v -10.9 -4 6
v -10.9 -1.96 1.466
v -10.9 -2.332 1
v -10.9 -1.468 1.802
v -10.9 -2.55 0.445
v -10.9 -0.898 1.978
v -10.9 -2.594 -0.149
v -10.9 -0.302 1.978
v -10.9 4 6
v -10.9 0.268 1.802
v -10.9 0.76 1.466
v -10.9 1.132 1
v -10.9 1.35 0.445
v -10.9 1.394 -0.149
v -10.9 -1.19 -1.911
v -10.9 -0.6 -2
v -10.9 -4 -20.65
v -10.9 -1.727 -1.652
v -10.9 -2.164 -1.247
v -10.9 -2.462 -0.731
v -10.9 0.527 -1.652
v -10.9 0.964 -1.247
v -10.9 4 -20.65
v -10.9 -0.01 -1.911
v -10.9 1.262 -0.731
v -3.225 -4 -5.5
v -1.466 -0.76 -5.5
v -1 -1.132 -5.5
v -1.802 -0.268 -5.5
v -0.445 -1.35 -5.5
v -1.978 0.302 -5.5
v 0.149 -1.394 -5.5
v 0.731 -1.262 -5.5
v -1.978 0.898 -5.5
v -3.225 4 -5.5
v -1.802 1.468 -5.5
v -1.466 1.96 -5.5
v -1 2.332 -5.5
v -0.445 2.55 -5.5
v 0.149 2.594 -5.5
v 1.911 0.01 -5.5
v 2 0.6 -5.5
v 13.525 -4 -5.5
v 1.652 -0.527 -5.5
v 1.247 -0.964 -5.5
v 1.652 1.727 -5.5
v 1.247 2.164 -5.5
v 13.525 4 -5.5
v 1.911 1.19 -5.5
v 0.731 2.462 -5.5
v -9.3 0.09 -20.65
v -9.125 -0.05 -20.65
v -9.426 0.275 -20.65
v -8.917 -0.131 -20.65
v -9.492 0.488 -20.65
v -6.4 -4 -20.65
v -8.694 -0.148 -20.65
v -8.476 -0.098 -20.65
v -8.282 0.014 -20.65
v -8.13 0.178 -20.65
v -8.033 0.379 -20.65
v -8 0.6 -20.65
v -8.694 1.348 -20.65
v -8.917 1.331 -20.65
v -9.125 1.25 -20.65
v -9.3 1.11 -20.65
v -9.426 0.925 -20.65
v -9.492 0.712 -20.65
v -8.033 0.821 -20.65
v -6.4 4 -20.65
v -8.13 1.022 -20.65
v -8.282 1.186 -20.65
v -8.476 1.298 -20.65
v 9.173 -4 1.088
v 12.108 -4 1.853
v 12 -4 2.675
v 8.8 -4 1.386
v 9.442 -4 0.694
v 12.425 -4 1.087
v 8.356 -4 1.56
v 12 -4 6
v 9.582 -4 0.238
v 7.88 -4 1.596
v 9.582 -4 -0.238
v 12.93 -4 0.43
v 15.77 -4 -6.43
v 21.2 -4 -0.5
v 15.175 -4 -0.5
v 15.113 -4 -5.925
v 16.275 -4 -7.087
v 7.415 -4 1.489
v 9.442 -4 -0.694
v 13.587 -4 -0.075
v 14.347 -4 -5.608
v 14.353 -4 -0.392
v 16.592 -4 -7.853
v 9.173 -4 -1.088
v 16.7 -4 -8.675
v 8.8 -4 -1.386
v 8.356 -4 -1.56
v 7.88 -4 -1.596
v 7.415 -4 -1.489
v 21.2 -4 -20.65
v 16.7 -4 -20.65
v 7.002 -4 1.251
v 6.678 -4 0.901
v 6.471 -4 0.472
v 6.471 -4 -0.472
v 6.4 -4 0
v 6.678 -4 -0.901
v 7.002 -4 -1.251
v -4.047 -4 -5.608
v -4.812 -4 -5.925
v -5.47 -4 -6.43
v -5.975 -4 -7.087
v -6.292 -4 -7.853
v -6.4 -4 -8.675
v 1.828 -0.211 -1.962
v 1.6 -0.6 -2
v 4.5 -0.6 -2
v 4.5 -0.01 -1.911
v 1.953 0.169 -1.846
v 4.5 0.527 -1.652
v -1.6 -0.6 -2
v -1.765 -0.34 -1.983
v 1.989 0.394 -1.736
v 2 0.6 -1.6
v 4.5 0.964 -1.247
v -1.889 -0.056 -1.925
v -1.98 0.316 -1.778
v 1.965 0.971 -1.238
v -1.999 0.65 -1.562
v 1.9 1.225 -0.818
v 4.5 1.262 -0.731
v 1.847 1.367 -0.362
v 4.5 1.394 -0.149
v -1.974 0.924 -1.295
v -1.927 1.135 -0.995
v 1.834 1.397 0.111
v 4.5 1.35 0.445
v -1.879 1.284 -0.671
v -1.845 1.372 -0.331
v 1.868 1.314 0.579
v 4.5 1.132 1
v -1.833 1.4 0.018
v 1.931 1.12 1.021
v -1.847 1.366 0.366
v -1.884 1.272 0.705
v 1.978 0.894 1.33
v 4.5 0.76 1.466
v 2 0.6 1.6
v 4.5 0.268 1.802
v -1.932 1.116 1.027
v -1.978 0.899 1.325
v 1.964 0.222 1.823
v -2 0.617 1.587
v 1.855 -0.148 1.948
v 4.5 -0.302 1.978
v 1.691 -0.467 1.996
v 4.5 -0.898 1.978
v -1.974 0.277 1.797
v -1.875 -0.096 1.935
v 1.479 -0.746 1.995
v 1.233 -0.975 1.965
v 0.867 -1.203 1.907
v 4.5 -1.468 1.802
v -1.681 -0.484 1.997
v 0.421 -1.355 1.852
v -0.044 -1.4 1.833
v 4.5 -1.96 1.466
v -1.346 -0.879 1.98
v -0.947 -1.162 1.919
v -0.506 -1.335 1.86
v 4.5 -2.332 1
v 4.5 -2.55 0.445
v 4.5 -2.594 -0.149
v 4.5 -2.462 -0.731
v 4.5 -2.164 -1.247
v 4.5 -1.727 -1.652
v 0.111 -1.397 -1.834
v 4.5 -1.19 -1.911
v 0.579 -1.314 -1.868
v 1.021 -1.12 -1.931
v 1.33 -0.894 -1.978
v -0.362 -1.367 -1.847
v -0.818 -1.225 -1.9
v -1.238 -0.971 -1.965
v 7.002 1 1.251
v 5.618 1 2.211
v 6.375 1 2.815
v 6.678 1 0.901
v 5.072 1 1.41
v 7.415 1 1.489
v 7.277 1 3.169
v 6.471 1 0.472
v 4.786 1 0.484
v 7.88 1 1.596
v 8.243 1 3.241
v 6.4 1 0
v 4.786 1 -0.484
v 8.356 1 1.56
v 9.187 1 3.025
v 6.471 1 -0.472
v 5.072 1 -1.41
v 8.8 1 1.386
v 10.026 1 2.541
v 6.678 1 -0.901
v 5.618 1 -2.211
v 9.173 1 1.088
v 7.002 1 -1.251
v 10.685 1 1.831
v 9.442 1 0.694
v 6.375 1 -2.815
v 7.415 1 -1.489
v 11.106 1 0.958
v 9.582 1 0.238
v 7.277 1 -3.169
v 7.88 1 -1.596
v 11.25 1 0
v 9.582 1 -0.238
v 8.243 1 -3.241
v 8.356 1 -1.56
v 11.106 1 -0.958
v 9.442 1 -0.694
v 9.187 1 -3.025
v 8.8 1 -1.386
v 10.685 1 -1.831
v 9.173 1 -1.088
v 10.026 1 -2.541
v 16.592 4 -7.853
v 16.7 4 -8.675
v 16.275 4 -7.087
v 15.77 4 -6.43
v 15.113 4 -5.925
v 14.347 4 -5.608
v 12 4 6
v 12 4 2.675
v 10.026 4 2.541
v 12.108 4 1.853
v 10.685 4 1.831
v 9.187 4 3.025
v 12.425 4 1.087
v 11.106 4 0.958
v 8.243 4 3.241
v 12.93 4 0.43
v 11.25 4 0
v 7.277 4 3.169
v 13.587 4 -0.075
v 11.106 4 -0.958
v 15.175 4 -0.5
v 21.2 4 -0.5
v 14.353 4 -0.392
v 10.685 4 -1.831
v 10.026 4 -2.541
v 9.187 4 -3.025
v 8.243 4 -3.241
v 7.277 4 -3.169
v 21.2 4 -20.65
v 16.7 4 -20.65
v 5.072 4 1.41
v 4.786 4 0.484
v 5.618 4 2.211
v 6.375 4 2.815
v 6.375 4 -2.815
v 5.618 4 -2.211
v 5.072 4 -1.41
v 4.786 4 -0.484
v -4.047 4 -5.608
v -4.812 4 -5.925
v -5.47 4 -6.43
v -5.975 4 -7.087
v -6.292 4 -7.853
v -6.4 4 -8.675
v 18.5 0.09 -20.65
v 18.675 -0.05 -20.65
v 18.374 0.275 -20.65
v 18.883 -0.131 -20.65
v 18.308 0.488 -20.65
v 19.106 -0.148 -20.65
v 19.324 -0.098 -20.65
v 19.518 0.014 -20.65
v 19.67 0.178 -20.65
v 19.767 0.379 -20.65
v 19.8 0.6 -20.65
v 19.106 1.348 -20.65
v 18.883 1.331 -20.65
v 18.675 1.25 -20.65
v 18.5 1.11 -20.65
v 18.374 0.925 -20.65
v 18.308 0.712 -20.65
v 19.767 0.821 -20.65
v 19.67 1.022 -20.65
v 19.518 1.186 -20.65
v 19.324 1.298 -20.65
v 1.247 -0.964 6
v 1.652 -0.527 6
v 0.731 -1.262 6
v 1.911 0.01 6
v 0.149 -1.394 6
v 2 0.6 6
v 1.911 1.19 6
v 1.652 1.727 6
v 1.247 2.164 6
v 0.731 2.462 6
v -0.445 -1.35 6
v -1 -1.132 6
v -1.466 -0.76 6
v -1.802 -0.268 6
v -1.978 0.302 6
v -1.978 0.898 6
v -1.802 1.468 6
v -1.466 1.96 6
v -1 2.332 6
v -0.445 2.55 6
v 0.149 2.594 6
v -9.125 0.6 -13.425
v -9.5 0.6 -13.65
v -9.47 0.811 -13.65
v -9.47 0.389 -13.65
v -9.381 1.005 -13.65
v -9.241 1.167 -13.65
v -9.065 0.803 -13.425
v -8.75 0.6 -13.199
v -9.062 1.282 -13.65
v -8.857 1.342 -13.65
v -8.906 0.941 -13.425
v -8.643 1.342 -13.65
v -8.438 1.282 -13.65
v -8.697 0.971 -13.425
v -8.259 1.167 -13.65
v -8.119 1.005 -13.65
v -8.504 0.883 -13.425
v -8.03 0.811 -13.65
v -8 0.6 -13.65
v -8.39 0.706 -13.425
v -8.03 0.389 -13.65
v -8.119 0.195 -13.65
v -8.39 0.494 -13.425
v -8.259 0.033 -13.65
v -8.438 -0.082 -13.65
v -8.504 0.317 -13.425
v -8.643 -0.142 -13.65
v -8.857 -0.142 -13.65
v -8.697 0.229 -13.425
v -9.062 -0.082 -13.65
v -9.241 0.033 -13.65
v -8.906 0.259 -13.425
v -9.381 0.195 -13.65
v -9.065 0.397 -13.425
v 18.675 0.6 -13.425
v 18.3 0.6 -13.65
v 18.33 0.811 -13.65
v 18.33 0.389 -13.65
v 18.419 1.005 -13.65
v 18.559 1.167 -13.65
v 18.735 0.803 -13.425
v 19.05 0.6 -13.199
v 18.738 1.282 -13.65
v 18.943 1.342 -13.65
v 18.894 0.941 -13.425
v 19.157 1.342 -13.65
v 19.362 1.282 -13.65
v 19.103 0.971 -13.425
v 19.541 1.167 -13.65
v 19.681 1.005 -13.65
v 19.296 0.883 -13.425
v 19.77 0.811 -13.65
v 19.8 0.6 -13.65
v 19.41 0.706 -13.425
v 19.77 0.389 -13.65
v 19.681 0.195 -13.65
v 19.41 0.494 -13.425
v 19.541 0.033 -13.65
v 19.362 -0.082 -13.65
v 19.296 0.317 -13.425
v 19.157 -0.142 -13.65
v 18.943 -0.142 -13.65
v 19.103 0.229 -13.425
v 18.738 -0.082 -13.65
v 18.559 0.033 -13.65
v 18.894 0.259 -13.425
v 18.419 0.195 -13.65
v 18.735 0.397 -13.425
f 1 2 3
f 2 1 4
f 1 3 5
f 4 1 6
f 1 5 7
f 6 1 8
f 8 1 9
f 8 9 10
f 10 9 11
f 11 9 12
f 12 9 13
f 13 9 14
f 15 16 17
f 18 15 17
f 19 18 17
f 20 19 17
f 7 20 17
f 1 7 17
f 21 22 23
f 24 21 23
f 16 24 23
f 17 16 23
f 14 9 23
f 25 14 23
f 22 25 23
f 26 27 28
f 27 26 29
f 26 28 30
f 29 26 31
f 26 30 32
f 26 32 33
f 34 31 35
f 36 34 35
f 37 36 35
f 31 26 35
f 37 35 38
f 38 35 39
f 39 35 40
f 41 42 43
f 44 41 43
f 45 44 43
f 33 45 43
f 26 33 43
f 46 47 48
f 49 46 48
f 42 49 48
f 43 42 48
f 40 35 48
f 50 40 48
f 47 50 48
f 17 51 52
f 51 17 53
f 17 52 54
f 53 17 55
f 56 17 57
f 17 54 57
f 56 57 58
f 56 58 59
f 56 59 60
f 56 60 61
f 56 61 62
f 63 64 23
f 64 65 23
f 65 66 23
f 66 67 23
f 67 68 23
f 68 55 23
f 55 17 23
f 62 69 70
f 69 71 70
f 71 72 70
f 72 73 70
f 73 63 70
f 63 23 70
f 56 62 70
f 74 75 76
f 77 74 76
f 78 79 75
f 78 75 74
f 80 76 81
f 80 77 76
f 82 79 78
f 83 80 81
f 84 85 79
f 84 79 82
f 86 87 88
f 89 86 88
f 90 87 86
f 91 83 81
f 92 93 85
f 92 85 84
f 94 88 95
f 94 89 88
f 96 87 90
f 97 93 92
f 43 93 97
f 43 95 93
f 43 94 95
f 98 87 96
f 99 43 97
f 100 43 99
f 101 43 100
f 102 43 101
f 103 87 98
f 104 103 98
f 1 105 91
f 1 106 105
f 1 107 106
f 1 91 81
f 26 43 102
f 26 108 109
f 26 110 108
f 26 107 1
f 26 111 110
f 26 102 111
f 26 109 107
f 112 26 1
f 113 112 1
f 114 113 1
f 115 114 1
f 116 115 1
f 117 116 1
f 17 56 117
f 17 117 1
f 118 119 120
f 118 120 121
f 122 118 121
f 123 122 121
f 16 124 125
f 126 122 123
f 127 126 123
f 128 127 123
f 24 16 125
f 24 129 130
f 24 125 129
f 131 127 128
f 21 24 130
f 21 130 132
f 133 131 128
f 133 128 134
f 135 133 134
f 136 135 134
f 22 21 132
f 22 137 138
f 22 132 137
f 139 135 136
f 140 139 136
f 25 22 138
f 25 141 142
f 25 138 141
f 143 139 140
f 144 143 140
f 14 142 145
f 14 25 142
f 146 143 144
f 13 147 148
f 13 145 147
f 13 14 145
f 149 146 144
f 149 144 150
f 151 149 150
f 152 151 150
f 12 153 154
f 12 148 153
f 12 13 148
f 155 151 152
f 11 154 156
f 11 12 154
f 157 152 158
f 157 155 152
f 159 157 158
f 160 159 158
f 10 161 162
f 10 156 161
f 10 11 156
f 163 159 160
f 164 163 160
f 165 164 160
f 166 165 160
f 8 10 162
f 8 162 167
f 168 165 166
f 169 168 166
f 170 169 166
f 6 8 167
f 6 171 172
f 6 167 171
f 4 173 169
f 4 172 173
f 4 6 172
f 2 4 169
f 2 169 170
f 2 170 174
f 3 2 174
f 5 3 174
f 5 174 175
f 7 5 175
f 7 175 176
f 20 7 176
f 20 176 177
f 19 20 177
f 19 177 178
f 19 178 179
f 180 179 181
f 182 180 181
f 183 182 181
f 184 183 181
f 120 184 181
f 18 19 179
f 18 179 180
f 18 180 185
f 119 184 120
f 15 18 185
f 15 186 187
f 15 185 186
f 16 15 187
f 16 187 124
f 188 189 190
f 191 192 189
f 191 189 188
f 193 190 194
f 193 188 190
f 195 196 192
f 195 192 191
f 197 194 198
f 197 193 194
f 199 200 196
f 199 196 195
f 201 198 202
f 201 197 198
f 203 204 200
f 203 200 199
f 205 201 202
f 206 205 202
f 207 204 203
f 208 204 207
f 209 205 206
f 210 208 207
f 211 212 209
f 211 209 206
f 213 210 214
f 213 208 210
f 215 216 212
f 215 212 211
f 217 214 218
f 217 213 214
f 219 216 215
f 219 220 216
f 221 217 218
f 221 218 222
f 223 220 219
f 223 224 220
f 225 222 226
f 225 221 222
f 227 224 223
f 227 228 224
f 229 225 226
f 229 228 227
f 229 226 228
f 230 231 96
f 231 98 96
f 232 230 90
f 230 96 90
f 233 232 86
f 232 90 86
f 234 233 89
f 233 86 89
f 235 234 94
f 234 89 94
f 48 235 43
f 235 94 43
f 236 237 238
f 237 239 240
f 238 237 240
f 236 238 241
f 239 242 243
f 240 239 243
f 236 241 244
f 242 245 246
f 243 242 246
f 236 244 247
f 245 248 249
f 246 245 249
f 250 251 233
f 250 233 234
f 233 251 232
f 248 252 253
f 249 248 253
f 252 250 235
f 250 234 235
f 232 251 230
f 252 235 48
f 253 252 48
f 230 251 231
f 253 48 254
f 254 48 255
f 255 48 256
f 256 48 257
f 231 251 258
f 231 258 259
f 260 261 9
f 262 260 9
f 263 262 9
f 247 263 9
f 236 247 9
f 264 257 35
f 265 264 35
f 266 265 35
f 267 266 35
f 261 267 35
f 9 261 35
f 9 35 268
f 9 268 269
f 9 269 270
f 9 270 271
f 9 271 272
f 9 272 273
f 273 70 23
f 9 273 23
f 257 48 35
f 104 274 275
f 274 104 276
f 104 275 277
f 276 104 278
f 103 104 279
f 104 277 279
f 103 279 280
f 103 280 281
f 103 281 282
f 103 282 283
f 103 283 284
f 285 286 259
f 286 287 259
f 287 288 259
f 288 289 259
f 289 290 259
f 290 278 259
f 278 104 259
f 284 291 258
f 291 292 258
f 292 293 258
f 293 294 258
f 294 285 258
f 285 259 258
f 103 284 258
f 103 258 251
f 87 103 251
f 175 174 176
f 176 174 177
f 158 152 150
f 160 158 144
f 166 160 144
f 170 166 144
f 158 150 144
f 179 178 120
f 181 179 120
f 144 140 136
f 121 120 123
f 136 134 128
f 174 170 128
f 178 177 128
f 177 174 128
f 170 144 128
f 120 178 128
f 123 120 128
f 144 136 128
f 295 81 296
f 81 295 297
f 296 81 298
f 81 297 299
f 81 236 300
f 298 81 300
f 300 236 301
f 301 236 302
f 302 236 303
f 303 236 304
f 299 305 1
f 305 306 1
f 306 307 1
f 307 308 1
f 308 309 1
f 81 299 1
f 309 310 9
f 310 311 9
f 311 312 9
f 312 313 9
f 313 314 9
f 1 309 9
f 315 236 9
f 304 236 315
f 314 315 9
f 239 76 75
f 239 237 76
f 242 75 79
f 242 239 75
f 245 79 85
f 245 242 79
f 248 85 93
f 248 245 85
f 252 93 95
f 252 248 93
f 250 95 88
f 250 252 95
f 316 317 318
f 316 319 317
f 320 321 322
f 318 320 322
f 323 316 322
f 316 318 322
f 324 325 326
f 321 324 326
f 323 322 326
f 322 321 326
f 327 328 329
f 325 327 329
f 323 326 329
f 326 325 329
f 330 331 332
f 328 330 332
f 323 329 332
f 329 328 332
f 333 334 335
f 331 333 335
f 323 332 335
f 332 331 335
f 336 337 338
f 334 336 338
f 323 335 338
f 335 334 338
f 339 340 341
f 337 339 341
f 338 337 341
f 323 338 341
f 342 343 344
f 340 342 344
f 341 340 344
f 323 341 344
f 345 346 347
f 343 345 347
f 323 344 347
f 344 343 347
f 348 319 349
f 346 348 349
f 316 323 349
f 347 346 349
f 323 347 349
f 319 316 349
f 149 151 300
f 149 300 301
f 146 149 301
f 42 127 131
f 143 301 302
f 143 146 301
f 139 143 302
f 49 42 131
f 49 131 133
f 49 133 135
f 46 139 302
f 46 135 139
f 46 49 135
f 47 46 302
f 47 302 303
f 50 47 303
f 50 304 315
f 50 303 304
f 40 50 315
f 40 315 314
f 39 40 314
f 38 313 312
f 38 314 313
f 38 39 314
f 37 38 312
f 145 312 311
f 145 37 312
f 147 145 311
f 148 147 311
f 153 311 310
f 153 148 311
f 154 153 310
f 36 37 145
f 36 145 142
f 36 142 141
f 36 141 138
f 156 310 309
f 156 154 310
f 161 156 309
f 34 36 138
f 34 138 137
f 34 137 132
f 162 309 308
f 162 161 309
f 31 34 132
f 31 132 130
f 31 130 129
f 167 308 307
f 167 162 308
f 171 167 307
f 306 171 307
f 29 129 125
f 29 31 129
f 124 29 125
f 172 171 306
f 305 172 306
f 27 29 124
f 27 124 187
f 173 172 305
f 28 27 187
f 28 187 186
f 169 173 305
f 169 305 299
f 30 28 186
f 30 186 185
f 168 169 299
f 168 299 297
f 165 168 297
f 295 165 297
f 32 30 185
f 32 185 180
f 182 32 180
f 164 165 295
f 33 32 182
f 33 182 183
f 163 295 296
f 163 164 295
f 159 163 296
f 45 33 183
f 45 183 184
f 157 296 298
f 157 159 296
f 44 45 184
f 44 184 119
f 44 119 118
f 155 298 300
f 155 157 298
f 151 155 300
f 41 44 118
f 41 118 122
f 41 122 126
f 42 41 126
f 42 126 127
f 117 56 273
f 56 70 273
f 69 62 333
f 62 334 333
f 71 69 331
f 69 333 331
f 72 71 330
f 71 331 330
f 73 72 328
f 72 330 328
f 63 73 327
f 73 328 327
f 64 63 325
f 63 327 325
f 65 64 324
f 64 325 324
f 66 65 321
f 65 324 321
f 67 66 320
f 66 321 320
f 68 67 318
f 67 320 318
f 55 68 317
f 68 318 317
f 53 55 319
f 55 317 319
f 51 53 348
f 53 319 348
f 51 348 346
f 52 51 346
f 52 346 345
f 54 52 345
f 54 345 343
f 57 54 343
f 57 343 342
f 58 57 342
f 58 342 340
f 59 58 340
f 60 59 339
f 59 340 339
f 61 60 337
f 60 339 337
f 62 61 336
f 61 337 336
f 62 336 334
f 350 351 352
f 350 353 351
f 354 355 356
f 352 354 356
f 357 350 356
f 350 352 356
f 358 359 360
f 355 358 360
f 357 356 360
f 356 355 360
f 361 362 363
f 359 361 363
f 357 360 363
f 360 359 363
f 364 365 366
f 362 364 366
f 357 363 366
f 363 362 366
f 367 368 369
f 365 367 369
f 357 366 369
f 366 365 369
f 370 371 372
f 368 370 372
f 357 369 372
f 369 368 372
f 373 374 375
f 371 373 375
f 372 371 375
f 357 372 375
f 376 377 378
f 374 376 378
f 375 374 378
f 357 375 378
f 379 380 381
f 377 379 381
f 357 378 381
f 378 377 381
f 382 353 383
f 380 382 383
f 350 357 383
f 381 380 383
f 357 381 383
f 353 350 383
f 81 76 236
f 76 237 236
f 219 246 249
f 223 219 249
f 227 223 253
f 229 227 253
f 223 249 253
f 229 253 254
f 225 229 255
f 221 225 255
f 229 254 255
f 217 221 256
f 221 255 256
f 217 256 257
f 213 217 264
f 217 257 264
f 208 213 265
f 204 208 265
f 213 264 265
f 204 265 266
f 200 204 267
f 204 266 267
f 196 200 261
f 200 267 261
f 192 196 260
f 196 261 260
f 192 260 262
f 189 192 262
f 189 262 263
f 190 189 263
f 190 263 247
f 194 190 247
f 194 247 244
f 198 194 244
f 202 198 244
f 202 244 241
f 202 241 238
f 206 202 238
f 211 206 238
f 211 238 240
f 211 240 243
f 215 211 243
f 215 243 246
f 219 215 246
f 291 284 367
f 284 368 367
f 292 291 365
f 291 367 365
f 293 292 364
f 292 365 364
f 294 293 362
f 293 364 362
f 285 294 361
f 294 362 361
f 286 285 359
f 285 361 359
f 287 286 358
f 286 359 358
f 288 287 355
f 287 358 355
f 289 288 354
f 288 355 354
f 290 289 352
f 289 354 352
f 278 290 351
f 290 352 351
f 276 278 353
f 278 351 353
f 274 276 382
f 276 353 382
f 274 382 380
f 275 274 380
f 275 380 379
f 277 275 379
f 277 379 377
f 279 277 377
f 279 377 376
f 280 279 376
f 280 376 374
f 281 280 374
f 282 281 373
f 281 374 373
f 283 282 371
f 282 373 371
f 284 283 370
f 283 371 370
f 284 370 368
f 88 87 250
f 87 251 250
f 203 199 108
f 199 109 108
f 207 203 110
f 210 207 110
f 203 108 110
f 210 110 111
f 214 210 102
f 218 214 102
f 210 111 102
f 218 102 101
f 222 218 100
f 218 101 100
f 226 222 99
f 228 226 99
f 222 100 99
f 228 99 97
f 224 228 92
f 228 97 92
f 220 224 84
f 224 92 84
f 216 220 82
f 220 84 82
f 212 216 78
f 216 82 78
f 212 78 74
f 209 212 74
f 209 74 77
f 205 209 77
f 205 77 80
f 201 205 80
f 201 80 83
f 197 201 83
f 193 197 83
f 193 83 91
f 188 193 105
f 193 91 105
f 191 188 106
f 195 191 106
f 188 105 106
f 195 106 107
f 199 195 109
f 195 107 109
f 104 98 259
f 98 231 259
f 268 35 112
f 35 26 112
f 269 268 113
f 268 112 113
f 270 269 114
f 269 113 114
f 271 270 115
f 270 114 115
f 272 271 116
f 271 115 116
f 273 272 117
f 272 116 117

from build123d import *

# Parameters (mm, degrees)
BOSS_EXTRUDE1_DEPTH            = 4
FILLET1_R                      = 3.175
CUT_EXTRUDE1_DEPTH             = 30.864067037
CUT_EXTRUDE1_DEPTH_BACK        = 30.864067037
SKETCH2_R                      = 2
CUT_EXTRUDE2_DEPTH             = 4.5
CUT_EXTRUDE2_DEPTH_BACK        = 30.864067037
SKETCH3_R                      = 2
F_1_5_1_5_DIAMETER_HOLE1_D     = 1.5
F_1_5_1_5_DIAMETER_HOLE1_DEPTH = 7
F_1_5_1_5_DIAMETER_HOLE1_TIP   = 0.450645464
CBORE_FOR_M3_SHCS1_D           = 3.2
CBORE_FOR_M3_SHCS1_CBORE_D     = 6.5
CBORE_FOR_M3_SHCS1_CBORE_DEPTH = 3


with BuildPart() as part:
    # Sketch1 → Boss-Extrude1 (new, symmetric)
    with BuildSketch(Plane(origin=(0, 0, 0), x_dir=(1, 0, 0), z_dir=(0, 1, 0))):
        Polygon((12, 0.5), (12, -6), (-10.9, -6), (-10.9, 20.65), (-6.4, 20.65), (-6.4, 5.5), (16.7, 5.5), (16.7, 20.65), (21.2, 20.65), (21.2, 0.5), align=None)
    extrude(amount=BOSS_EXTRUDE1_DEPTH, both=True)

    # Fillet1
    fillet1_edges = [part.edges().sort_by_distance(p)[0] for p in [
        (12, 0, -0.5),
        (-6.4, 0, -5.5),
        (16.7, 0, -5.5),
    ]]
    fillet(fillet1_edges, radius=FILLET1_R)

    # Sketch2 → Cut-Extrude1 (cut, two sides: drawn at the far end of the back side and taken through both)
    with BuildSketch(Plane.XY.offset(-CUT_EXTRUDE1_DEPTH_BACK)):
        with Locations((0, 0.6)):
            Circle(SKETCH2_R)
    extrude(amount=CUT_EXTRUDE1_DEPTH + CUT_EXTRUDE1_DEPTH_BACK, mode=Mode.SUBTRACT)

    # Sketch3 → Cut-Extrude2 (cut, two sides: drawn at the far end of the back side and taken through both)
    with BuildSketch(Plane(origin=(0, 0, 0), x_dir=(0, 0, -1), z_dir=(1, 0, 0)).offset(-CUT_EXTRUDE2_DEPTH_BACK)):
        with Locations((0, -0.6)):
            Circle(SKETCH3_R)
    extrude(amount=CUT_EXTRUDE2_DEPTH + CUT_EXTRUDE2_DEPTH_BACK, mode=Mode.SUBTRACT)

    # Ø1.5 (1.5) Diameter Hole1
    with Locations(Plane(origin=(0, 0, -20.65), x_dir=(-1, 0, 0), z_dir=(0, 0, -1))):
        with Locations((-19.05, 0.6), (8.75, 0.6)):
            Hole(F_1_5_1_5_DIAMETER_HOLE1_D / 2, depth=F_1_5_1_5_DIAMETER_HOLE1_DEPTH)
            with Locations((0, 0, -(F_1_5_1_5_DIAMETER_HOLE1_DEPTH + F_1_5_1_5_DIAMETER_HOLE1_TIP / 2))):  # 118° drill point
                Cone(0, F_1_5_1_5_DIAMETER_HOLE1_D / 2, F_1_5_1_5_DIAMETER_HOLE1_TIP, mode=Mode.SUBTRACT)

    # CBORE for M3 SHCS1 (through all)
    with Locations(Plane(origin=(0, 4, 0), x_dir=(1, 0, 0), z_dir=(0, 1, 0))):
        with Locations((8, 0)):
            CounterBoreHole(CBORE_FOR_M3_SHCS1_D / 2, CBORE_FOR_M3_SHCS1_CBORE_D / 2, CBORE_FOR_M3_SHCS1_CBORE_DEPTH)


solid = part.part
